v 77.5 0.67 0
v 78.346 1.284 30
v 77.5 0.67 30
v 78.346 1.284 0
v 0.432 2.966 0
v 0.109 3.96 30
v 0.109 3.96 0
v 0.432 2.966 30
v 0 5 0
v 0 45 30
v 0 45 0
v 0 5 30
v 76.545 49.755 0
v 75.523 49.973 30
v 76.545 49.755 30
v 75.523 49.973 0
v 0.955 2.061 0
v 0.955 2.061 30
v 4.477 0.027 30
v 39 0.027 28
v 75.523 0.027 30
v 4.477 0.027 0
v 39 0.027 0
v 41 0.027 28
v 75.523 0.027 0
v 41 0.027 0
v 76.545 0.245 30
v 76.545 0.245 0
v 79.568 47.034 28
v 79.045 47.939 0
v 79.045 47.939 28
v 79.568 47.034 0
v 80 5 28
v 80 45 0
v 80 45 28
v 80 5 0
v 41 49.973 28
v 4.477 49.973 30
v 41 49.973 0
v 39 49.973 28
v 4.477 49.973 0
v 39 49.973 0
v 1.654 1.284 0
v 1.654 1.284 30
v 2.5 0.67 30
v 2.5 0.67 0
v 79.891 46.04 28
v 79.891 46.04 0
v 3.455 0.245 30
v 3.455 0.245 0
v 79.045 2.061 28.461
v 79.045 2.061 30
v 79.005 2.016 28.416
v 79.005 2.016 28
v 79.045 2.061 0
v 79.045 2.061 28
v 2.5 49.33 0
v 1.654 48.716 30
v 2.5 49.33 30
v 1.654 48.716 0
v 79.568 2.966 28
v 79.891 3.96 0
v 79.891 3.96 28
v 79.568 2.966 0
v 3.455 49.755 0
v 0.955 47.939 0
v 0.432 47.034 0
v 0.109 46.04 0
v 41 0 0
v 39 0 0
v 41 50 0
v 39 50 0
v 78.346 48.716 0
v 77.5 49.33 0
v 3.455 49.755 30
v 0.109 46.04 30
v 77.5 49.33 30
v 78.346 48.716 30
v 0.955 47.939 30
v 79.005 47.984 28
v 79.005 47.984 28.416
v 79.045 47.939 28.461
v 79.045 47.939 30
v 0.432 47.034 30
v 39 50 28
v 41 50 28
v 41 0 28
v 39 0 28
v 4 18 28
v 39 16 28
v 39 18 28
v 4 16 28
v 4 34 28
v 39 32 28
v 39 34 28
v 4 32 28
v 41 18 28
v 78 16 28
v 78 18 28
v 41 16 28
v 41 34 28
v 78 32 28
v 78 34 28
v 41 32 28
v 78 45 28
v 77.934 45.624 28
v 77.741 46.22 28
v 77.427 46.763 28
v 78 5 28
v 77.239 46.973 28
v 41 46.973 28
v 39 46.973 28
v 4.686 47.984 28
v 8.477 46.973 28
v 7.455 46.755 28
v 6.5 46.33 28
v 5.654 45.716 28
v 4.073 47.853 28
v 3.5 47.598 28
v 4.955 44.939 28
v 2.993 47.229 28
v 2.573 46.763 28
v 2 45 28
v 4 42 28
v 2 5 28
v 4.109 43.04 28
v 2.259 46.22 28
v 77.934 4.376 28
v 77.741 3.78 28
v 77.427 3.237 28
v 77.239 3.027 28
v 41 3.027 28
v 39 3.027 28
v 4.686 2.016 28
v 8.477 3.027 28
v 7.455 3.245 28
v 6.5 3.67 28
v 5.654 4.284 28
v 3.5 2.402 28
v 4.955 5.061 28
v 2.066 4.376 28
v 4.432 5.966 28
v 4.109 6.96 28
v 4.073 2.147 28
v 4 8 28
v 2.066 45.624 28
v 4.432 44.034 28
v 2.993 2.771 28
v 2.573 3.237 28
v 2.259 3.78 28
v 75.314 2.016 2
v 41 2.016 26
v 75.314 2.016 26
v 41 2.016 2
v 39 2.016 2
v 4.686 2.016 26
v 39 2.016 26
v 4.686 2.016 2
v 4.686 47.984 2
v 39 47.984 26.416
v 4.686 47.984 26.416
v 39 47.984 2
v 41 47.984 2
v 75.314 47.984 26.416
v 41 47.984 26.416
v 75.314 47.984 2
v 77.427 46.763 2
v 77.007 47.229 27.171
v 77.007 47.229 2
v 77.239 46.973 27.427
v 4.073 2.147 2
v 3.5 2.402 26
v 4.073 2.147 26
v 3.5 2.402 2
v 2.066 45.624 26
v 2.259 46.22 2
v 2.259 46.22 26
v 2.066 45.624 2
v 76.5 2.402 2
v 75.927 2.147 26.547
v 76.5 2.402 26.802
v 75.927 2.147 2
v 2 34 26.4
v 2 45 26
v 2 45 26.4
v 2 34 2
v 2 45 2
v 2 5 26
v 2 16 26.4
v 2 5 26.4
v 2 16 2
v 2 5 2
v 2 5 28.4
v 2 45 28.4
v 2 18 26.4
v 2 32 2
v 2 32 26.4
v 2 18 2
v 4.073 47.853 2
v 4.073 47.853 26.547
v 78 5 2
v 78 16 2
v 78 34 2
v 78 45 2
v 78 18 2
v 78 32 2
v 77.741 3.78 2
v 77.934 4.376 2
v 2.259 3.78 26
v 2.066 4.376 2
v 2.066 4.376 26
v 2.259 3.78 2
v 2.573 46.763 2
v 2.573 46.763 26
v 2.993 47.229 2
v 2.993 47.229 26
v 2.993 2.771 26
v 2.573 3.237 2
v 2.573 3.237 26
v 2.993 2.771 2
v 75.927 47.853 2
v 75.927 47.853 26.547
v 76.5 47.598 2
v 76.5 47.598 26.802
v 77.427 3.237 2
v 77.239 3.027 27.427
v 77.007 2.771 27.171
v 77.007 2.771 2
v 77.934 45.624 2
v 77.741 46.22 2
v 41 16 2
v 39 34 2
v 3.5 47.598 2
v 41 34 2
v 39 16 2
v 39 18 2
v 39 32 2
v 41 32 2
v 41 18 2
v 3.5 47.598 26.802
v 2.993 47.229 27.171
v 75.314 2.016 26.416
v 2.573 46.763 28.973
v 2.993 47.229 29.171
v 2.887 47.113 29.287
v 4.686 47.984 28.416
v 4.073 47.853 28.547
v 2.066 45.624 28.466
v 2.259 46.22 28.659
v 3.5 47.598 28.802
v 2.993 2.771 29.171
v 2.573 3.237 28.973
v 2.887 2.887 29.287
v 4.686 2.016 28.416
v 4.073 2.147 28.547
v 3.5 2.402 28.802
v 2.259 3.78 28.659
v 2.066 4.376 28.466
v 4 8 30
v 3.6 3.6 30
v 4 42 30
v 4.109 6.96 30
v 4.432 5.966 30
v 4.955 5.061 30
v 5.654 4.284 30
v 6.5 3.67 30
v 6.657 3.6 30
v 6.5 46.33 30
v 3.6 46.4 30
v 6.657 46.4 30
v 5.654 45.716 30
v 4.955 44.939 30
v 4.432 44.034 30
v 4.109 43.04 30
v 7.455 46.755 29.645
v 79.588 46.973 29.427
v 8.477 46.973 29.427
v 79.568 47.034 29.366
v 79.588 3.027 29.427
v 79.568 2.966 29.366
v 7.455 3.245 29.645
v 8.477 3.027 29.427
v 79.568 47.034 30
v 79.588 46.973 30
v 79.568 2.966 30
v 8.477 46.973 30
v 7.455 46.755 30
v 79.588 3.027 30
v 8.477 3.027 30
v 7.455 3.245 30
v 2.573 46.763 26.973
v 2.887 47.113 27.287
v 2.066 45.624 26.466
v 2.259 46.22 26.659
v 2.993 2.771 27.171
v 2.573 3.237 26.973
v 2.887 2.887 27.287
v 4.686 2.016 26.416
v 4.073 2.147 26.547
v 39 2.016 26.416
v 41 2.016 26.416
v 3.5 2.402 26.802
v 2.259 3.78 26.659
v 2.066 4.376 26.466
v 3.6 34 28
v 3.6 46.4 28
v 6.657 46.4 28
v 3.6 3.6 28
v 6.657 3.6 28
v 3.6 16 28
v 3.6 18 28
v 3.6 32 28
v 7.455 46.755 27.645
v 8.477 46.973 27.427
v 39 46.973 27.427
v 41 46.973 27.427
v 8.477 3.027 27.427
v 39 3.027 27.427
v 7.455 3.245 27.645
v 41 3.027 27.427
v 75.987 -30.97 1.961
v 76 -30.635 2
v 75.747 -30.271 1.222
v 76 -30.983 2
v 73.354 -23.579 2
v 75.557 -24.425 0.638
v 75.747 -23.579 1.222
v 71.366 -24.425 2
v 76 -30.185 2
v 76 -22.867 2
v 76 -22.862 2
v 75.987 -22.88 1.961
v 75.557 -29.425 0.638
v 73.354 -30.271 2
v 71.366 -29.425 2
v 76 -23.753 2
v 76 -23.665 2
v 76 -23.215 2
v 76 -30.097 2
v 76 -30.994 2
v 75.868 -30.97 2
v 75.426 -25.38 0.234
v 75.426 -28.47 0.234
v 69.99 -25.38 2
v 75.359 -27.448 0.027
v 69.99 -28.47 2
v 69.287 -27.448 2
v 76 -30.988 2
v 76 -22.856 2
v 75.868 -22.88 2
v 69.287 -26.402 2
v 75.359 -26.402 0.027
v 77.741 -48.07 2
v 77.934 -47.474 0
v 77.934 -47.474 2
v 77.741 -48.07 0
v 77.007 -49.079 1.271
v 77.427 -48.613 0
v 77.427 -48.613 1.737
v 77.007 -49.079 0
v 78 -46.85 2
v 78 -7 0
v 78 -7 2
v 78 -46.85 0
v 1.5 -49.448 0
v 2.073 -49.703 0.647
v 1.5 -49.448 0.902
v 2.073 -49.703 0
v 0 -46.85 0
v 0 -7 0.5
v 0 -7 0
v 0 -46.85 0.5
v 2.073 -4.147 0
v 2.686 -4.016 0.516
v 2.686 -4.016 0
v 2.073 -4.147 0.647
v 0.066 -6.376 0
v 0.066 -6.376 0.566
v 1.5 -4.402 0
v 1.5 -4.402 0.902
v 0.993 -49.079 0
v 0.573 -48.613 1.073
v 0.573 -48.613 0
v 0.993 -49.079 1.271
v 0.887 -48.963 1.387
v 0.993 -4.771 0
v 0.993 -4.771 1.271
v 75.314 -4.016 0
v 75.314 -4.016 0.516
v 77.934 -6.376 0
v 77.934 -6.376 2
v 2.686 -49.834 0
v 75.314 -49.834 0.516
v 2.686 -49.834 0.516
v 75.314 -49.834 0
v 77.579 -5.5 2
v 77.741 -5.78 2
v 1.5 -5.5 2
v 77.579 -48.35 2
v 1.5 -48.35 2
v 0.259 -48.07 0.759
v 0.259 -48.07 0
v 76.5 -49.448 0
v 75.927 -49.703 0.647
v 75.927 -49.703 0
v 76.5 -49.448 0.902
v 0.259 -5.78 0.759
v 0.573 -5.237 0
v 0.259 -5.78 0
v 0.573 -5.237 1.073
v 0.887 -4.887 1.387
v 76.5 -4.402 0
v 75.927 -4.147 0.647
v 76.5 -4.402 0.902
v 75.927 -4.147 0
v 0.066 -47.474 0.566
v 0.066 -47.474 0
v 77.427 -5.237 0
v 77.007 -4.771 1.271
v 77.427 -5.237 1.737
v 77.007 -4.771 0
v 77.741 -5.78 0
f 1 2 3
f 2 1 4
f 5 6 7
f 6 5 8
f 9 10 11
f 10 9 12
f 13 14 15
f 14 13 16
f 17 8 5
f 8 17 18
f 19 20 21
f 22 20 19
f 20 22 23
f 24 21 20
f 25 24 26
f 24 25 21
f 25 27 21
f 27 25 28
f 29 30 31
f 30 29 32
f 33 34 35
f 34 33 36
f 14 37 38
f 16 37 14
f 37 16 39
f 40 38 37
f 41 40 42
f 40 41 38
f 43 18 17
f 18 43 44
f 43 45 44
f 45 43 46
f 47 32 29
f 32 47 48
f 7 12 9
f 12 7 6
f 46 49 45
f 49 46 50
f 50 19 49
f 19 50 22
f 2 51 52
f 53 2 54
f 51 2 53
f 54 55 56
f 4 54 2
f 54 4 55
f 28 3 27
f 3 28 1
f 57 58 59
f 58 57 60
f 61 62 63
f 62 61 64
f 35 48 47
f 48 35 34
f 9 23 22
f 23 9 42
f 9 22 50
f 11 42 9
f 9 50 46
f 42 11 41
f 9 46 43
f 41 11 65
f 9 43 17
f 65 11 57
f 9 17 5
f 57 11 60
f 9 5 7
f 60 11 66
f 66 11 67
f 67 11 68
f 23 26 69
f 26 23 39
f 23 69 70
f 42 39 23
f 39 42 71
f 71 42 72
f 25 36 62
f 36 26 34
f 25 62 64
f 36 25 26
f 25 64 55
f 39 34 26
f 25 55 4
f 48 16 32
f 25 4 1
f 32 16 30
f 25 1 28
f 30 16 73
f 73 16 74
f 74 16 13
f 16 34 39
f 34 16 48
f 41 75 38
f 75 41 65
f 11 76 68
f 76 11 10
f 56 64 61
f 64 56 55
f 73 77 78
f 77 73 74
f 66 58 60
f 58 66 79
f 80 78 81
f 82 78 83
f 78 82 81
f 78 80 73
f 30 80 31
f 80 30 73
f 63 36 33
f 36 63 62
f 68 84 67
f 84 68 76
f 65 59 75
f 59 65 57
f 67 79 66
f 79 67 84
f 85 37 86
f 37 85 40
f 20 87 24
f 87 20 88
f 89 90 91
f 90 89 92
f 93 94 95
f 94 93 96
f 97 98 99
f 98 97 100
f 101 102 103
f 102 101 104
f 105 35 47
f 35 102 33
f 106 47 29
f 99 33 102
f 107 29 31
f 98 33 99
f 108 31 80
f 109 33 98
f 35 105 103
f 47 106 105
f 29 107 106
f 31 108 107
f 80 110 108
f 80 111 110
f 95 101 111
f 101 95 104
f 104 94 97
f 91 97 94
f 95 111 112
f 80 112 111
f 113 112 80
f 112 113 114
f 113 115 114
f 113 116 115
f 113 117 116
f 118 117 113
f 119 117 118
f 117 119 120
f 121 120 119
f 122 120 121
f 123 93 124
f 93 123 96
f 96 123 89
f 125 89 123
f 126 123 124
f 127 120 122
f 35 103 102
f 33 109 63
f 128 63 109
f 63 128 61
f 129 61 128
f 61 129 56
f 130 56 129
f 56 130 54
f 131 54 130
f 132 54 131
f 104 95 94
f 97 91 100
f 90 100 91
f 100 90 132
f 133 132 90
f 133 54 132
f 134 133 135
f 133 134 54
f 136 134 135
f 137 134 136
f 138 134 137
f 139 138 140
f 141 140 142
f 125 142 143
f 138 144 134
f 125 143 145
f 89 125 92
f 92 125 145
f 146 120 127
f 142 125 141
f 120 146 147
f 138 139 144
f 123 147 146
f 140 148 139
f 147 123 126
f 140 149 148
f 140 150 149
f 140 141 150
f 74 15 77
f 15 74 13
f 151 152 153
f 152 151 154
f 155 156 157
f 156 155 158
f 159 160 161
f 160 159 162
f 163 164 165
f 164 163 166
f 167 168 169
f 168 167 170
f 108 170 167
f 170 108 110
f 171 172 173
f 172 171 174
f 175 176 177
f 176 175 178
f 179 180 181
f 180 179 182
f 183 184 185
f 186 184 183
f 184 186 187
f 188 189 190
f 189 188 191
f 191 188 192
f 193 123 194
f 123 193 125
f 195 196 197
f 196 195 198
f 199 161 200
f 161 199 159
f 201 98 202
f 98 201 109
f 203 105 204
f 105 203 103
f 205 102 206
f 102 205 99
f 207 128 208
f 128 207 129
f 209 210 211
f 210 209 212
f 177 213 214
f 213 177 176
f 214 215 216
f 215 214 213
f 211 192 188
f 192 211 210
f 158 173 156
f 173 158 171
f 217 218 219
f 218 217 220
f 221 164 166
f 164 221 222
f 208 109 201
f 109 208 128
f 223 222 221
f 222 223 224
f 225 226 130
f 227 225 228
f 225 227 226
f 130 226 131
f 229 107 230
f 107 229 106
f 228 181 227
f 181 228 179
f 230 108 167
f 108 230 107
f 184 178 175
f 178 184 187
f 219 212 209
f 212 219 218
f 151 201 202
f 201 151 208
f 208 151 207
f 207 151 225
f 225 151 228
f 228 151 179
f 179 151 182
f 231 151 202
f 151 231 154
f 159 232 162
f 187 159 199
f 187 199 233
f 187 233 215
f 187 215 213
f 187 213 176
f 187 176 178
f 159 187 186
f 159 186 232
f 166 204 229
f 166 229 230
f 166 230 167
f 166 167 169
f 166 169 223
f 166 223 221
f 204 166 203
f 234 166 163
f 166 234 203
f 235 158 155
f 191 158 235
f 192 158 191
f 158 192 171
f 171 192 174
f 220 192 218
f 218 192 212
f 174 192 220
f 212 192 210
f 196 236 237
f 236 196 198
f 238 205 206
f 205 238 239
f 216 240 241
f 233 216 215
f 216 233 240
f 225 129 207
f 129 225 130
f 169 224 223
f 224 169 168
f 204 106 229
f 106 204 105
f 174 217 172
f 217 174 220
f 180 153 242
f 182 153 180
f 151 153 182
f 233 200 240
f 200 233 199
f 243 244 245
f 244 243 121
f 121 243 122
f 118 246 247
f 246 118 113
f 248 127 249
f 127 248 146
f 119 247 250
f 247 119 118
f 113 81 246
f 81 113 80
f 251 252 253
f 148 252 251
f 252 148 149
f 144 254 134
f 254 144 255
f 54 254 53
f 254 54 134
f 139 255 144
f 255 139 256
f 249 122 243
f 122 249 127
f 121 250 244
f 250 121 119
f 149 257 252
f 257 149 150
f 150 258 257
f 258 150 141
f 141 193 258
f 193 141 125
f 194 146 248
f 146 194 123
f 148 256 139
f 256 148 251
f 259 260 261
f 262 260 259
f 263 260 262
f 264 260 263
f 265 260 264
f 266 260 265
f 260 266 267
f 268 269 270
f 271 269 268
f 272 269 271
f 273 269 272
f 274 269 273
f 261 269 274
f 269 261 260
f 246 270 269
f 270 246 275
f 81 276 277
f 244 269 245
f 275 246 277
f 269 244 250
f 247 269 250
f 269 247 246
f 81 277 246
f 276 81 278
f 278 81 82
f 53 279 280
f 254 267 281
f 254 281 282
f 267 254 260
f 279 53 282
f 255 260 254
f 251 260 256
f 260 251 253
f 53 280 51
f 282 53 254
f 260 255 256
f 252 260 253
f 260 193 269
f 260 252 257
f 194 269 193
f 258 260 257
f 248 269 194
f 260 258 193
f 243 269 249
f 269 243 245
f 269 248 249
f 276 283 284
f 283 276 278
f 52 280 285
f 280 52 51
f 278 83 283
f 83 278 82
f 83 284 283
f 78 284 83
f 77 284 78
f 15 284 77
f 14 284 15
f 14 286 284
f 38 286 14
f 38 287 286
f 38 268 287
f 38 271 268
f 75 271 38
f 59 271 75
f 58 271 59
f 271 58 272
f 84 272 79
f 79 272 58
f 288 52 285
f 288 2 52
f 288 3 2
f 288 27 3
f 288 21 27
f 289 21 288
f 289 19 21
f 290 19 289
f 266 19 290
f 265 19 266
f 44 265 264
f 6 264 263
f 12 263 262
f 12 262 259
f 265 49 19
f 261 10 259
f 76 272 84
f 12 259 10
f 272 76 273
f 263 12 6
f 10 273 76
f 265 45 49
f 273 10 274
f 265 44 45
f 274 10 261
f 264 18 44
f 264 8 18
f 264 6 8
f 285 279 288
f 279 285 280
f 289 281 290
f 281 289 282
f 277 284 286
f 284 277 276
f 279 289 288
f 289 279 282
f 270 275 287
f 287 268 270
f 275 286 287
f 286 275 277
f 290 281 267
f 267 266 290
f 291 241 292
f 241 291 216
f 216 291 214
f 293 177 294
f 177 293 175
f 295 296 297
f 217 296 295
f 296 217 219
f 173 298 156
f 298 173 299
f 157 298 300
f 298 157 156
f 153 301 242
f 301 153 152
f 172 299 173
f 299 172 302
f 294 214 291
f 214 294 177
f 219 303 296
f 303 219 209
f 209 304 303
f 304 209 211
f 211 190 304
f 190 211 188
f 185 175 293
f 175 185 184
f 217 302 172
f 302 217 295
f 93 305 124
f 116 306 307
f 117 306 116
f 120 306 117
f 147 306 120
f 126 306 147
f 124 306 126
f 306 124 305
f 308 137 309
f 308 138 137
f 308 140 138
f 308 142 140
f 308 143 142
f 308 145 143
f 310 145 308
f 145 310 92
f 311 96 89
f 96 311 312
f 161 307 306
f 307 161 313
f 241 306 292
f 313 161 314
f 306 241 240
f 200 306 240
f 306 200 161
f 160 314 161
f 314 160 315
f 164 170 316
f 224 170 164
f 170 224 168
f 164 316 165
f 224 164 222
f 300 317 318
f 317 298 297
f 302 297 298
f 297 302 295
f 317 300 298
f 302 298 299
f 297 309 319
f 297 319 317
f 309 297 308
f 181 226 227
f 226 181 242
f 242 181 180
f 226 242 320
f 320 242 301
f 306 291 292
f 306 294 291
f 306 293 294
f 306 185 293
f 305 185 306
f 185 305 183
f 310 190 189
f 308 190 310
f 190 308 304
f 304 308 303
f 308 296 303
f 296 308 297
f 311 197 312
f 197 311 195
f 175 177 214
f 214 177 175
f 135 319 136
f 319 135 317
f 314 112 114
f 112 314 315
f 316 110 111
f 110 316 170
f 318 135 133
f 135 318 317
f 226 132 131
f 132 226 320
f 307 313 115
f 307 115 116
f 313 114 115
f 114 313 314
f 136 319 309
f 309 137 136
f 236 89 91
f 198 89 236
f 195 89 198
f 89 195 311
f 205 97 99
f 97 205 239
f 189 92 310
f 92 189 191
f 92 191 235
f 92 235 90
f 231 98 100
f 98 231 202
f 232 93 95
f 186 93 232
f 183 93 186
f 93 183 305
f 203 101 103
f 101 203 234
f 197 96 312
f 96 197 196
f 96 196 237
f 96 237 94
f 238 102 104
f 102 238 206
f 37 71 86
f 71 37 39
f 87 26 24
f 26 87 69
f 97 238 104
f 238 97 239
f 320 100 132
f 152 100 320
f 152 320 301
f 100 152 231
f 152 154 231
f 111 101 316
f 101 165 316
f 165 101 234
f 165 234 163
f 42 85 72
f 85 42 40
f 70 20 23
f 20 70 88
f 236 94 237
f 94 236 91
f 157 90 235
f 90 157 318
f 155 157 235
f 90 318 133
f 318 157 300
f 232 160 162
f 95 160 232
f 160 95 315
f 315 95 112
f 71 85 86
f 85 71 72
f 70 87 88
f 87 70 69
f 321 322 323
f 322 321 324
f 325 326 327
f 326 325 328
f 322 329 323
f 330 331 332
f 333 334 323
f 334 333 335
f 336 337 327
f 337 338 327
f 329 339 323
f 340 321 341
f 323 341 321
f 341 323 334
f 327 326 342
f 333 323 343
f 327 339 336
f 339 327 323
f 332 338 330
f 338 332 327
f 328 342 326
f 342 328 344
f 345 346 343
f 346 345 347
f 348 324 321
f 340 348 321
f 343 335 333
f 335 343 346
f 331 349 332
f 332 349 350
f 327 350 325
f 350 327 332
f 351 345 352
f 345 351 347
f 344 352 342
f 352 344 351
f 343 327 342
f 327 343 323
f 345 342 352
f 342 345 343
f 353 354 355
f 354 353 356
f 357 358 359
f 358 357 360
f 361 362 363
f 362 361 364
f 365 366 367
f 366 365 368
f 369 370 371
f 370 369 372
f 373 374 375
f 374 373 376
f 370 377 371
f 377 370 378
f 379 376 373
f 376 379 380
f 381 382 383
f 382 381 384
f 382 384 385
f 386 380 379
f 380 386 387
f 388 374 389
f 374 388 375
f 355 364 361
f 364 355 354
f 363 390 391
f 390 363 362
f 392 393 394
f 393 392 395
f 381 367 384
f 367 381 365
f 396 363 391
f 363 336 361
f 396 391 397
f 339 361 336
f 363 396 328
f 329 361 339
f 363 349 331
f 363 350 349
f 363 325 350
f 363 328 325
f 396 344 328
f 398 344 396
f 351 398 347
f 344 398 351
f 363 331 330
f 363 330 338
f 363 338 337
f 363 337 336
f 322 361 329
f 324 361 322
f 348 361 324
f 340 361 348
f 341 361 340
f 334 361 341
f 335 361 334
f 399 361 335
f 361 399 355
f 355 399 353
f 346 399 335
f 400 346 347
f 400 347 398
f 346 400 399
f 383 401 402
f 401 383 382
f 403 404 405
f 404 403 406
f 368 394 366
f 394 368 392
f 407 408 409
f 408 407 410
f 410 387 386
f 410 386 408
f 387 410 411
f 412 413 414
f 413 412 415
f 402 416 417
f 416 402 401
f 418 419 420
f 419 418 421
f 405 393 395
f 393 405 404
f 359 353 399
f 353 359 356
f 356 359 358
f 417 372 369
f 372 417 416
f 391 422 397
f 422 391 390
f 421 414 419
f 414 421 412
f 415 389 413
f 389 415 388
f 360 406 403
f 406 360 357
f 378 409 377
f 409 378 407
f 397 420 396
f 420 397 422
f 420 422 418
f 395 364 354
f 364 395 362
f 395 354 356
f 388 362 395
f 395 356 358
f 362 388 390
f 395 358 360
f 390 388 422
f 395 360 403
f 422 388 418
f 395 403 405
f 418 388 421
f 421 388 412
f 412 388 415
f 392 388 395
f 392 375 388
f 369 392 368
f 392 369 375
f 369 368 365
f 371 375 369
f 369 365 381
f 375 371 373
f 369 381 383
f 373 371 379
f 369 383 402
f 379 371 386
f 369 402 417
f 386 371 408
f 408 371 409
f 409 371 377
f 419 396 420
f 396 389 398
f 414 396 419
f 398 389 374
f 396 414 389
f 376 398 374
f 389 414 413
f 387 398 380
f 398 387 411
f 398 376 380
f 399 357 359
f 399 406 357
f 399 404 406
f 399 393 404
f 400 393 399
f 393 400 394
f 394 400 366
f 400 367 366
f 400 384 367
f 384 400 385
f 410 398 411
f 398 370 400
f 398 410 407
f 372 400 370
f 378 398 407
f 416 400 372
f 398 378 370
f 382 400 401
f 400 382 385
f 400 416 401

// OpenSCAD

itemsShown="both"; // [both,box,lid]
boxLength=80;
boxWidth=50;
boxHeight=30;
cornerRadius=5;
wallThickness=2;
bottomThickness=2;
lidThickness=2;
lidClearance=0.15;
lidEdgeThickness=0.5;
// Notch in the lid
withNotch=true;//true;//[true:false]

//partition
partition = "show"; //[show,hide]
xcount = 3;
ycount = 2;

/* [Global] */
if (itemsShown=="box") showBox();
if (itemsShown=="lid") showLid();
if (itemsShown=="both"){showBox();showLid();}

module showLid(){
	translate ([0, -2*wallThickness, 0]) 
	roundBoxLid(l=boxLength-wallThickness,
				w=boxWidth-2*wallThickness-lidClearance,
				h=lidThickness,
				et=lidEdgeThickness,
				r=cornerRadius-wallThickness,
				notch=withNotch);
}

module showBox(){
    union()
    {
        round_box(l=boxLength,
                  w=boxWidth,
                  h=boxHeight,
                  bt=bottomThickness,
                  wt=wallThickness,
                  lt=lidThickness,
                  r=cornerRadius);
        if(partition=="show") partition();
    }
}

module round_box(l=40,w=30,h=30,bt=2,wt=2,lt=2,r=5,){
    difference() { 
        round_cube(l=l,w=w,h=h-lt,r=r);
        translate ([wt, wt, bt]) 
        round_cube(l=l-wt*2,w=w-wt*2,h=h,r=r-wt);
    }
    //use two box rims. one to make a slope to support the lid
    roundBoxRim();
    translate ([0, 0, -wt]) roundBoxRim();
}

module partition(l=boxLength,w=boxWidth,h=boxHeight,wt=wallThickness){
        for(i=[0:xcount]){
            pw=((w-wt)/xcount);
            difference()
            {
                translate([0,(pw)*i,0])cube([l,wt,h-wt]);
                translate([0,0,0])cube([l,wt,h-wt]);
                translate([0,w-wt,0])cube([l,wt,h-wt]);
            }
        }
        for(i=[0:ycount]){
            pw=((l-wt)/ycount);
            difference()
            {
                translate([(pw)*i,0,0])cube([wt,w,h-wt]);
                translate([0,0,0])cube([wt,w,h-wt]);
                translate([l-wt,0,0])cube([wt,w,h-wt]);
            }
        }
}

module roundBoxRim(l=boxLength,
				   w=boxWidth,
				   h=boxHeight,
				   et=lidEdgeThickness,
				   r=cornerRadius,
				   wt=wallThickness,
				   lt=lidThickness){
	difference() { 
		translate ([0, 0, h-lt]) 
		round_cube(l=l,w=w,h=lt,r=r);
		translate ([wt+lt,wt+lt-et*2,h-lt-0.1]) 
		round_cube(l=l*2,w=w-2*(wt+lt)+4*et,h=lt+0.2,r=r-wt+lt);

		//subtract out a lid to make the ledge
		translate ([wt, w-wt, h-lt-0.1])
		roundBoxLid(l=l*2,w=w-2*wt,h=lt+0.1,wt=wt,t=lt,et=0.5,r=r-wt,notch=false);
	}
}

module roundBoxLid(l=40,w=30,h=3,wt=2,t=2,et=0.5,r=5,notch=true){
	translate ([l, 0, 0]) 
	rotate (a = [0, 0, 180]) 
	difference(){
		round_cube(l=l,w=w,h=h,t=t,r=r);

		translate ([-1, 0, et]) rotate (a = [45, 0, 0])  cube (size = [l+2, h*2, h*2]); 
		translate ([-1, w, et]) rotate (a = [45, 0, 0])  cube (size = [l+2, h*2, h*2]); 
		translate ([l, -1, et]) rotate (a = [45, 0, 90]) cube (size = [w+2, h*2, h*2]); 
		if (notch==true){
			translate([2,w/2,h+0.001]) thumbNotch(10/2,72,t);
		}
	}
}

module thumbNotch(
	thumbR=12/2,
	angle=72,
	notchHeight=2){

	size=10*thumbR;

	rotate([0,0,90])
	difference(){
		translate([0,
					(thumbR*sin(angle)-notchHeight)/tan(angle),
					 thumbR*sin(angle)-notchHeight])
		rotate([angle,0,0])
		cylinder(r=thumbR,h=size,$fn=30);

		translate([-size,-size,0])
		cube(size*2);
	}
}

module round_cube(l=40,w=30,h=20,r=5,$fn=30){
	hull(){ 
		translate ([r, r, 0]) cylinder (h = h, r=r);
		translate ([r, w-r, 0]) cylinder (h = h, r=r);
		translate ([l-r,w-r, 0]) cylinder (h = h, r=r);
		translate ([l-r, r, 0]) cylinder (h = h, r=r);
	}
}
